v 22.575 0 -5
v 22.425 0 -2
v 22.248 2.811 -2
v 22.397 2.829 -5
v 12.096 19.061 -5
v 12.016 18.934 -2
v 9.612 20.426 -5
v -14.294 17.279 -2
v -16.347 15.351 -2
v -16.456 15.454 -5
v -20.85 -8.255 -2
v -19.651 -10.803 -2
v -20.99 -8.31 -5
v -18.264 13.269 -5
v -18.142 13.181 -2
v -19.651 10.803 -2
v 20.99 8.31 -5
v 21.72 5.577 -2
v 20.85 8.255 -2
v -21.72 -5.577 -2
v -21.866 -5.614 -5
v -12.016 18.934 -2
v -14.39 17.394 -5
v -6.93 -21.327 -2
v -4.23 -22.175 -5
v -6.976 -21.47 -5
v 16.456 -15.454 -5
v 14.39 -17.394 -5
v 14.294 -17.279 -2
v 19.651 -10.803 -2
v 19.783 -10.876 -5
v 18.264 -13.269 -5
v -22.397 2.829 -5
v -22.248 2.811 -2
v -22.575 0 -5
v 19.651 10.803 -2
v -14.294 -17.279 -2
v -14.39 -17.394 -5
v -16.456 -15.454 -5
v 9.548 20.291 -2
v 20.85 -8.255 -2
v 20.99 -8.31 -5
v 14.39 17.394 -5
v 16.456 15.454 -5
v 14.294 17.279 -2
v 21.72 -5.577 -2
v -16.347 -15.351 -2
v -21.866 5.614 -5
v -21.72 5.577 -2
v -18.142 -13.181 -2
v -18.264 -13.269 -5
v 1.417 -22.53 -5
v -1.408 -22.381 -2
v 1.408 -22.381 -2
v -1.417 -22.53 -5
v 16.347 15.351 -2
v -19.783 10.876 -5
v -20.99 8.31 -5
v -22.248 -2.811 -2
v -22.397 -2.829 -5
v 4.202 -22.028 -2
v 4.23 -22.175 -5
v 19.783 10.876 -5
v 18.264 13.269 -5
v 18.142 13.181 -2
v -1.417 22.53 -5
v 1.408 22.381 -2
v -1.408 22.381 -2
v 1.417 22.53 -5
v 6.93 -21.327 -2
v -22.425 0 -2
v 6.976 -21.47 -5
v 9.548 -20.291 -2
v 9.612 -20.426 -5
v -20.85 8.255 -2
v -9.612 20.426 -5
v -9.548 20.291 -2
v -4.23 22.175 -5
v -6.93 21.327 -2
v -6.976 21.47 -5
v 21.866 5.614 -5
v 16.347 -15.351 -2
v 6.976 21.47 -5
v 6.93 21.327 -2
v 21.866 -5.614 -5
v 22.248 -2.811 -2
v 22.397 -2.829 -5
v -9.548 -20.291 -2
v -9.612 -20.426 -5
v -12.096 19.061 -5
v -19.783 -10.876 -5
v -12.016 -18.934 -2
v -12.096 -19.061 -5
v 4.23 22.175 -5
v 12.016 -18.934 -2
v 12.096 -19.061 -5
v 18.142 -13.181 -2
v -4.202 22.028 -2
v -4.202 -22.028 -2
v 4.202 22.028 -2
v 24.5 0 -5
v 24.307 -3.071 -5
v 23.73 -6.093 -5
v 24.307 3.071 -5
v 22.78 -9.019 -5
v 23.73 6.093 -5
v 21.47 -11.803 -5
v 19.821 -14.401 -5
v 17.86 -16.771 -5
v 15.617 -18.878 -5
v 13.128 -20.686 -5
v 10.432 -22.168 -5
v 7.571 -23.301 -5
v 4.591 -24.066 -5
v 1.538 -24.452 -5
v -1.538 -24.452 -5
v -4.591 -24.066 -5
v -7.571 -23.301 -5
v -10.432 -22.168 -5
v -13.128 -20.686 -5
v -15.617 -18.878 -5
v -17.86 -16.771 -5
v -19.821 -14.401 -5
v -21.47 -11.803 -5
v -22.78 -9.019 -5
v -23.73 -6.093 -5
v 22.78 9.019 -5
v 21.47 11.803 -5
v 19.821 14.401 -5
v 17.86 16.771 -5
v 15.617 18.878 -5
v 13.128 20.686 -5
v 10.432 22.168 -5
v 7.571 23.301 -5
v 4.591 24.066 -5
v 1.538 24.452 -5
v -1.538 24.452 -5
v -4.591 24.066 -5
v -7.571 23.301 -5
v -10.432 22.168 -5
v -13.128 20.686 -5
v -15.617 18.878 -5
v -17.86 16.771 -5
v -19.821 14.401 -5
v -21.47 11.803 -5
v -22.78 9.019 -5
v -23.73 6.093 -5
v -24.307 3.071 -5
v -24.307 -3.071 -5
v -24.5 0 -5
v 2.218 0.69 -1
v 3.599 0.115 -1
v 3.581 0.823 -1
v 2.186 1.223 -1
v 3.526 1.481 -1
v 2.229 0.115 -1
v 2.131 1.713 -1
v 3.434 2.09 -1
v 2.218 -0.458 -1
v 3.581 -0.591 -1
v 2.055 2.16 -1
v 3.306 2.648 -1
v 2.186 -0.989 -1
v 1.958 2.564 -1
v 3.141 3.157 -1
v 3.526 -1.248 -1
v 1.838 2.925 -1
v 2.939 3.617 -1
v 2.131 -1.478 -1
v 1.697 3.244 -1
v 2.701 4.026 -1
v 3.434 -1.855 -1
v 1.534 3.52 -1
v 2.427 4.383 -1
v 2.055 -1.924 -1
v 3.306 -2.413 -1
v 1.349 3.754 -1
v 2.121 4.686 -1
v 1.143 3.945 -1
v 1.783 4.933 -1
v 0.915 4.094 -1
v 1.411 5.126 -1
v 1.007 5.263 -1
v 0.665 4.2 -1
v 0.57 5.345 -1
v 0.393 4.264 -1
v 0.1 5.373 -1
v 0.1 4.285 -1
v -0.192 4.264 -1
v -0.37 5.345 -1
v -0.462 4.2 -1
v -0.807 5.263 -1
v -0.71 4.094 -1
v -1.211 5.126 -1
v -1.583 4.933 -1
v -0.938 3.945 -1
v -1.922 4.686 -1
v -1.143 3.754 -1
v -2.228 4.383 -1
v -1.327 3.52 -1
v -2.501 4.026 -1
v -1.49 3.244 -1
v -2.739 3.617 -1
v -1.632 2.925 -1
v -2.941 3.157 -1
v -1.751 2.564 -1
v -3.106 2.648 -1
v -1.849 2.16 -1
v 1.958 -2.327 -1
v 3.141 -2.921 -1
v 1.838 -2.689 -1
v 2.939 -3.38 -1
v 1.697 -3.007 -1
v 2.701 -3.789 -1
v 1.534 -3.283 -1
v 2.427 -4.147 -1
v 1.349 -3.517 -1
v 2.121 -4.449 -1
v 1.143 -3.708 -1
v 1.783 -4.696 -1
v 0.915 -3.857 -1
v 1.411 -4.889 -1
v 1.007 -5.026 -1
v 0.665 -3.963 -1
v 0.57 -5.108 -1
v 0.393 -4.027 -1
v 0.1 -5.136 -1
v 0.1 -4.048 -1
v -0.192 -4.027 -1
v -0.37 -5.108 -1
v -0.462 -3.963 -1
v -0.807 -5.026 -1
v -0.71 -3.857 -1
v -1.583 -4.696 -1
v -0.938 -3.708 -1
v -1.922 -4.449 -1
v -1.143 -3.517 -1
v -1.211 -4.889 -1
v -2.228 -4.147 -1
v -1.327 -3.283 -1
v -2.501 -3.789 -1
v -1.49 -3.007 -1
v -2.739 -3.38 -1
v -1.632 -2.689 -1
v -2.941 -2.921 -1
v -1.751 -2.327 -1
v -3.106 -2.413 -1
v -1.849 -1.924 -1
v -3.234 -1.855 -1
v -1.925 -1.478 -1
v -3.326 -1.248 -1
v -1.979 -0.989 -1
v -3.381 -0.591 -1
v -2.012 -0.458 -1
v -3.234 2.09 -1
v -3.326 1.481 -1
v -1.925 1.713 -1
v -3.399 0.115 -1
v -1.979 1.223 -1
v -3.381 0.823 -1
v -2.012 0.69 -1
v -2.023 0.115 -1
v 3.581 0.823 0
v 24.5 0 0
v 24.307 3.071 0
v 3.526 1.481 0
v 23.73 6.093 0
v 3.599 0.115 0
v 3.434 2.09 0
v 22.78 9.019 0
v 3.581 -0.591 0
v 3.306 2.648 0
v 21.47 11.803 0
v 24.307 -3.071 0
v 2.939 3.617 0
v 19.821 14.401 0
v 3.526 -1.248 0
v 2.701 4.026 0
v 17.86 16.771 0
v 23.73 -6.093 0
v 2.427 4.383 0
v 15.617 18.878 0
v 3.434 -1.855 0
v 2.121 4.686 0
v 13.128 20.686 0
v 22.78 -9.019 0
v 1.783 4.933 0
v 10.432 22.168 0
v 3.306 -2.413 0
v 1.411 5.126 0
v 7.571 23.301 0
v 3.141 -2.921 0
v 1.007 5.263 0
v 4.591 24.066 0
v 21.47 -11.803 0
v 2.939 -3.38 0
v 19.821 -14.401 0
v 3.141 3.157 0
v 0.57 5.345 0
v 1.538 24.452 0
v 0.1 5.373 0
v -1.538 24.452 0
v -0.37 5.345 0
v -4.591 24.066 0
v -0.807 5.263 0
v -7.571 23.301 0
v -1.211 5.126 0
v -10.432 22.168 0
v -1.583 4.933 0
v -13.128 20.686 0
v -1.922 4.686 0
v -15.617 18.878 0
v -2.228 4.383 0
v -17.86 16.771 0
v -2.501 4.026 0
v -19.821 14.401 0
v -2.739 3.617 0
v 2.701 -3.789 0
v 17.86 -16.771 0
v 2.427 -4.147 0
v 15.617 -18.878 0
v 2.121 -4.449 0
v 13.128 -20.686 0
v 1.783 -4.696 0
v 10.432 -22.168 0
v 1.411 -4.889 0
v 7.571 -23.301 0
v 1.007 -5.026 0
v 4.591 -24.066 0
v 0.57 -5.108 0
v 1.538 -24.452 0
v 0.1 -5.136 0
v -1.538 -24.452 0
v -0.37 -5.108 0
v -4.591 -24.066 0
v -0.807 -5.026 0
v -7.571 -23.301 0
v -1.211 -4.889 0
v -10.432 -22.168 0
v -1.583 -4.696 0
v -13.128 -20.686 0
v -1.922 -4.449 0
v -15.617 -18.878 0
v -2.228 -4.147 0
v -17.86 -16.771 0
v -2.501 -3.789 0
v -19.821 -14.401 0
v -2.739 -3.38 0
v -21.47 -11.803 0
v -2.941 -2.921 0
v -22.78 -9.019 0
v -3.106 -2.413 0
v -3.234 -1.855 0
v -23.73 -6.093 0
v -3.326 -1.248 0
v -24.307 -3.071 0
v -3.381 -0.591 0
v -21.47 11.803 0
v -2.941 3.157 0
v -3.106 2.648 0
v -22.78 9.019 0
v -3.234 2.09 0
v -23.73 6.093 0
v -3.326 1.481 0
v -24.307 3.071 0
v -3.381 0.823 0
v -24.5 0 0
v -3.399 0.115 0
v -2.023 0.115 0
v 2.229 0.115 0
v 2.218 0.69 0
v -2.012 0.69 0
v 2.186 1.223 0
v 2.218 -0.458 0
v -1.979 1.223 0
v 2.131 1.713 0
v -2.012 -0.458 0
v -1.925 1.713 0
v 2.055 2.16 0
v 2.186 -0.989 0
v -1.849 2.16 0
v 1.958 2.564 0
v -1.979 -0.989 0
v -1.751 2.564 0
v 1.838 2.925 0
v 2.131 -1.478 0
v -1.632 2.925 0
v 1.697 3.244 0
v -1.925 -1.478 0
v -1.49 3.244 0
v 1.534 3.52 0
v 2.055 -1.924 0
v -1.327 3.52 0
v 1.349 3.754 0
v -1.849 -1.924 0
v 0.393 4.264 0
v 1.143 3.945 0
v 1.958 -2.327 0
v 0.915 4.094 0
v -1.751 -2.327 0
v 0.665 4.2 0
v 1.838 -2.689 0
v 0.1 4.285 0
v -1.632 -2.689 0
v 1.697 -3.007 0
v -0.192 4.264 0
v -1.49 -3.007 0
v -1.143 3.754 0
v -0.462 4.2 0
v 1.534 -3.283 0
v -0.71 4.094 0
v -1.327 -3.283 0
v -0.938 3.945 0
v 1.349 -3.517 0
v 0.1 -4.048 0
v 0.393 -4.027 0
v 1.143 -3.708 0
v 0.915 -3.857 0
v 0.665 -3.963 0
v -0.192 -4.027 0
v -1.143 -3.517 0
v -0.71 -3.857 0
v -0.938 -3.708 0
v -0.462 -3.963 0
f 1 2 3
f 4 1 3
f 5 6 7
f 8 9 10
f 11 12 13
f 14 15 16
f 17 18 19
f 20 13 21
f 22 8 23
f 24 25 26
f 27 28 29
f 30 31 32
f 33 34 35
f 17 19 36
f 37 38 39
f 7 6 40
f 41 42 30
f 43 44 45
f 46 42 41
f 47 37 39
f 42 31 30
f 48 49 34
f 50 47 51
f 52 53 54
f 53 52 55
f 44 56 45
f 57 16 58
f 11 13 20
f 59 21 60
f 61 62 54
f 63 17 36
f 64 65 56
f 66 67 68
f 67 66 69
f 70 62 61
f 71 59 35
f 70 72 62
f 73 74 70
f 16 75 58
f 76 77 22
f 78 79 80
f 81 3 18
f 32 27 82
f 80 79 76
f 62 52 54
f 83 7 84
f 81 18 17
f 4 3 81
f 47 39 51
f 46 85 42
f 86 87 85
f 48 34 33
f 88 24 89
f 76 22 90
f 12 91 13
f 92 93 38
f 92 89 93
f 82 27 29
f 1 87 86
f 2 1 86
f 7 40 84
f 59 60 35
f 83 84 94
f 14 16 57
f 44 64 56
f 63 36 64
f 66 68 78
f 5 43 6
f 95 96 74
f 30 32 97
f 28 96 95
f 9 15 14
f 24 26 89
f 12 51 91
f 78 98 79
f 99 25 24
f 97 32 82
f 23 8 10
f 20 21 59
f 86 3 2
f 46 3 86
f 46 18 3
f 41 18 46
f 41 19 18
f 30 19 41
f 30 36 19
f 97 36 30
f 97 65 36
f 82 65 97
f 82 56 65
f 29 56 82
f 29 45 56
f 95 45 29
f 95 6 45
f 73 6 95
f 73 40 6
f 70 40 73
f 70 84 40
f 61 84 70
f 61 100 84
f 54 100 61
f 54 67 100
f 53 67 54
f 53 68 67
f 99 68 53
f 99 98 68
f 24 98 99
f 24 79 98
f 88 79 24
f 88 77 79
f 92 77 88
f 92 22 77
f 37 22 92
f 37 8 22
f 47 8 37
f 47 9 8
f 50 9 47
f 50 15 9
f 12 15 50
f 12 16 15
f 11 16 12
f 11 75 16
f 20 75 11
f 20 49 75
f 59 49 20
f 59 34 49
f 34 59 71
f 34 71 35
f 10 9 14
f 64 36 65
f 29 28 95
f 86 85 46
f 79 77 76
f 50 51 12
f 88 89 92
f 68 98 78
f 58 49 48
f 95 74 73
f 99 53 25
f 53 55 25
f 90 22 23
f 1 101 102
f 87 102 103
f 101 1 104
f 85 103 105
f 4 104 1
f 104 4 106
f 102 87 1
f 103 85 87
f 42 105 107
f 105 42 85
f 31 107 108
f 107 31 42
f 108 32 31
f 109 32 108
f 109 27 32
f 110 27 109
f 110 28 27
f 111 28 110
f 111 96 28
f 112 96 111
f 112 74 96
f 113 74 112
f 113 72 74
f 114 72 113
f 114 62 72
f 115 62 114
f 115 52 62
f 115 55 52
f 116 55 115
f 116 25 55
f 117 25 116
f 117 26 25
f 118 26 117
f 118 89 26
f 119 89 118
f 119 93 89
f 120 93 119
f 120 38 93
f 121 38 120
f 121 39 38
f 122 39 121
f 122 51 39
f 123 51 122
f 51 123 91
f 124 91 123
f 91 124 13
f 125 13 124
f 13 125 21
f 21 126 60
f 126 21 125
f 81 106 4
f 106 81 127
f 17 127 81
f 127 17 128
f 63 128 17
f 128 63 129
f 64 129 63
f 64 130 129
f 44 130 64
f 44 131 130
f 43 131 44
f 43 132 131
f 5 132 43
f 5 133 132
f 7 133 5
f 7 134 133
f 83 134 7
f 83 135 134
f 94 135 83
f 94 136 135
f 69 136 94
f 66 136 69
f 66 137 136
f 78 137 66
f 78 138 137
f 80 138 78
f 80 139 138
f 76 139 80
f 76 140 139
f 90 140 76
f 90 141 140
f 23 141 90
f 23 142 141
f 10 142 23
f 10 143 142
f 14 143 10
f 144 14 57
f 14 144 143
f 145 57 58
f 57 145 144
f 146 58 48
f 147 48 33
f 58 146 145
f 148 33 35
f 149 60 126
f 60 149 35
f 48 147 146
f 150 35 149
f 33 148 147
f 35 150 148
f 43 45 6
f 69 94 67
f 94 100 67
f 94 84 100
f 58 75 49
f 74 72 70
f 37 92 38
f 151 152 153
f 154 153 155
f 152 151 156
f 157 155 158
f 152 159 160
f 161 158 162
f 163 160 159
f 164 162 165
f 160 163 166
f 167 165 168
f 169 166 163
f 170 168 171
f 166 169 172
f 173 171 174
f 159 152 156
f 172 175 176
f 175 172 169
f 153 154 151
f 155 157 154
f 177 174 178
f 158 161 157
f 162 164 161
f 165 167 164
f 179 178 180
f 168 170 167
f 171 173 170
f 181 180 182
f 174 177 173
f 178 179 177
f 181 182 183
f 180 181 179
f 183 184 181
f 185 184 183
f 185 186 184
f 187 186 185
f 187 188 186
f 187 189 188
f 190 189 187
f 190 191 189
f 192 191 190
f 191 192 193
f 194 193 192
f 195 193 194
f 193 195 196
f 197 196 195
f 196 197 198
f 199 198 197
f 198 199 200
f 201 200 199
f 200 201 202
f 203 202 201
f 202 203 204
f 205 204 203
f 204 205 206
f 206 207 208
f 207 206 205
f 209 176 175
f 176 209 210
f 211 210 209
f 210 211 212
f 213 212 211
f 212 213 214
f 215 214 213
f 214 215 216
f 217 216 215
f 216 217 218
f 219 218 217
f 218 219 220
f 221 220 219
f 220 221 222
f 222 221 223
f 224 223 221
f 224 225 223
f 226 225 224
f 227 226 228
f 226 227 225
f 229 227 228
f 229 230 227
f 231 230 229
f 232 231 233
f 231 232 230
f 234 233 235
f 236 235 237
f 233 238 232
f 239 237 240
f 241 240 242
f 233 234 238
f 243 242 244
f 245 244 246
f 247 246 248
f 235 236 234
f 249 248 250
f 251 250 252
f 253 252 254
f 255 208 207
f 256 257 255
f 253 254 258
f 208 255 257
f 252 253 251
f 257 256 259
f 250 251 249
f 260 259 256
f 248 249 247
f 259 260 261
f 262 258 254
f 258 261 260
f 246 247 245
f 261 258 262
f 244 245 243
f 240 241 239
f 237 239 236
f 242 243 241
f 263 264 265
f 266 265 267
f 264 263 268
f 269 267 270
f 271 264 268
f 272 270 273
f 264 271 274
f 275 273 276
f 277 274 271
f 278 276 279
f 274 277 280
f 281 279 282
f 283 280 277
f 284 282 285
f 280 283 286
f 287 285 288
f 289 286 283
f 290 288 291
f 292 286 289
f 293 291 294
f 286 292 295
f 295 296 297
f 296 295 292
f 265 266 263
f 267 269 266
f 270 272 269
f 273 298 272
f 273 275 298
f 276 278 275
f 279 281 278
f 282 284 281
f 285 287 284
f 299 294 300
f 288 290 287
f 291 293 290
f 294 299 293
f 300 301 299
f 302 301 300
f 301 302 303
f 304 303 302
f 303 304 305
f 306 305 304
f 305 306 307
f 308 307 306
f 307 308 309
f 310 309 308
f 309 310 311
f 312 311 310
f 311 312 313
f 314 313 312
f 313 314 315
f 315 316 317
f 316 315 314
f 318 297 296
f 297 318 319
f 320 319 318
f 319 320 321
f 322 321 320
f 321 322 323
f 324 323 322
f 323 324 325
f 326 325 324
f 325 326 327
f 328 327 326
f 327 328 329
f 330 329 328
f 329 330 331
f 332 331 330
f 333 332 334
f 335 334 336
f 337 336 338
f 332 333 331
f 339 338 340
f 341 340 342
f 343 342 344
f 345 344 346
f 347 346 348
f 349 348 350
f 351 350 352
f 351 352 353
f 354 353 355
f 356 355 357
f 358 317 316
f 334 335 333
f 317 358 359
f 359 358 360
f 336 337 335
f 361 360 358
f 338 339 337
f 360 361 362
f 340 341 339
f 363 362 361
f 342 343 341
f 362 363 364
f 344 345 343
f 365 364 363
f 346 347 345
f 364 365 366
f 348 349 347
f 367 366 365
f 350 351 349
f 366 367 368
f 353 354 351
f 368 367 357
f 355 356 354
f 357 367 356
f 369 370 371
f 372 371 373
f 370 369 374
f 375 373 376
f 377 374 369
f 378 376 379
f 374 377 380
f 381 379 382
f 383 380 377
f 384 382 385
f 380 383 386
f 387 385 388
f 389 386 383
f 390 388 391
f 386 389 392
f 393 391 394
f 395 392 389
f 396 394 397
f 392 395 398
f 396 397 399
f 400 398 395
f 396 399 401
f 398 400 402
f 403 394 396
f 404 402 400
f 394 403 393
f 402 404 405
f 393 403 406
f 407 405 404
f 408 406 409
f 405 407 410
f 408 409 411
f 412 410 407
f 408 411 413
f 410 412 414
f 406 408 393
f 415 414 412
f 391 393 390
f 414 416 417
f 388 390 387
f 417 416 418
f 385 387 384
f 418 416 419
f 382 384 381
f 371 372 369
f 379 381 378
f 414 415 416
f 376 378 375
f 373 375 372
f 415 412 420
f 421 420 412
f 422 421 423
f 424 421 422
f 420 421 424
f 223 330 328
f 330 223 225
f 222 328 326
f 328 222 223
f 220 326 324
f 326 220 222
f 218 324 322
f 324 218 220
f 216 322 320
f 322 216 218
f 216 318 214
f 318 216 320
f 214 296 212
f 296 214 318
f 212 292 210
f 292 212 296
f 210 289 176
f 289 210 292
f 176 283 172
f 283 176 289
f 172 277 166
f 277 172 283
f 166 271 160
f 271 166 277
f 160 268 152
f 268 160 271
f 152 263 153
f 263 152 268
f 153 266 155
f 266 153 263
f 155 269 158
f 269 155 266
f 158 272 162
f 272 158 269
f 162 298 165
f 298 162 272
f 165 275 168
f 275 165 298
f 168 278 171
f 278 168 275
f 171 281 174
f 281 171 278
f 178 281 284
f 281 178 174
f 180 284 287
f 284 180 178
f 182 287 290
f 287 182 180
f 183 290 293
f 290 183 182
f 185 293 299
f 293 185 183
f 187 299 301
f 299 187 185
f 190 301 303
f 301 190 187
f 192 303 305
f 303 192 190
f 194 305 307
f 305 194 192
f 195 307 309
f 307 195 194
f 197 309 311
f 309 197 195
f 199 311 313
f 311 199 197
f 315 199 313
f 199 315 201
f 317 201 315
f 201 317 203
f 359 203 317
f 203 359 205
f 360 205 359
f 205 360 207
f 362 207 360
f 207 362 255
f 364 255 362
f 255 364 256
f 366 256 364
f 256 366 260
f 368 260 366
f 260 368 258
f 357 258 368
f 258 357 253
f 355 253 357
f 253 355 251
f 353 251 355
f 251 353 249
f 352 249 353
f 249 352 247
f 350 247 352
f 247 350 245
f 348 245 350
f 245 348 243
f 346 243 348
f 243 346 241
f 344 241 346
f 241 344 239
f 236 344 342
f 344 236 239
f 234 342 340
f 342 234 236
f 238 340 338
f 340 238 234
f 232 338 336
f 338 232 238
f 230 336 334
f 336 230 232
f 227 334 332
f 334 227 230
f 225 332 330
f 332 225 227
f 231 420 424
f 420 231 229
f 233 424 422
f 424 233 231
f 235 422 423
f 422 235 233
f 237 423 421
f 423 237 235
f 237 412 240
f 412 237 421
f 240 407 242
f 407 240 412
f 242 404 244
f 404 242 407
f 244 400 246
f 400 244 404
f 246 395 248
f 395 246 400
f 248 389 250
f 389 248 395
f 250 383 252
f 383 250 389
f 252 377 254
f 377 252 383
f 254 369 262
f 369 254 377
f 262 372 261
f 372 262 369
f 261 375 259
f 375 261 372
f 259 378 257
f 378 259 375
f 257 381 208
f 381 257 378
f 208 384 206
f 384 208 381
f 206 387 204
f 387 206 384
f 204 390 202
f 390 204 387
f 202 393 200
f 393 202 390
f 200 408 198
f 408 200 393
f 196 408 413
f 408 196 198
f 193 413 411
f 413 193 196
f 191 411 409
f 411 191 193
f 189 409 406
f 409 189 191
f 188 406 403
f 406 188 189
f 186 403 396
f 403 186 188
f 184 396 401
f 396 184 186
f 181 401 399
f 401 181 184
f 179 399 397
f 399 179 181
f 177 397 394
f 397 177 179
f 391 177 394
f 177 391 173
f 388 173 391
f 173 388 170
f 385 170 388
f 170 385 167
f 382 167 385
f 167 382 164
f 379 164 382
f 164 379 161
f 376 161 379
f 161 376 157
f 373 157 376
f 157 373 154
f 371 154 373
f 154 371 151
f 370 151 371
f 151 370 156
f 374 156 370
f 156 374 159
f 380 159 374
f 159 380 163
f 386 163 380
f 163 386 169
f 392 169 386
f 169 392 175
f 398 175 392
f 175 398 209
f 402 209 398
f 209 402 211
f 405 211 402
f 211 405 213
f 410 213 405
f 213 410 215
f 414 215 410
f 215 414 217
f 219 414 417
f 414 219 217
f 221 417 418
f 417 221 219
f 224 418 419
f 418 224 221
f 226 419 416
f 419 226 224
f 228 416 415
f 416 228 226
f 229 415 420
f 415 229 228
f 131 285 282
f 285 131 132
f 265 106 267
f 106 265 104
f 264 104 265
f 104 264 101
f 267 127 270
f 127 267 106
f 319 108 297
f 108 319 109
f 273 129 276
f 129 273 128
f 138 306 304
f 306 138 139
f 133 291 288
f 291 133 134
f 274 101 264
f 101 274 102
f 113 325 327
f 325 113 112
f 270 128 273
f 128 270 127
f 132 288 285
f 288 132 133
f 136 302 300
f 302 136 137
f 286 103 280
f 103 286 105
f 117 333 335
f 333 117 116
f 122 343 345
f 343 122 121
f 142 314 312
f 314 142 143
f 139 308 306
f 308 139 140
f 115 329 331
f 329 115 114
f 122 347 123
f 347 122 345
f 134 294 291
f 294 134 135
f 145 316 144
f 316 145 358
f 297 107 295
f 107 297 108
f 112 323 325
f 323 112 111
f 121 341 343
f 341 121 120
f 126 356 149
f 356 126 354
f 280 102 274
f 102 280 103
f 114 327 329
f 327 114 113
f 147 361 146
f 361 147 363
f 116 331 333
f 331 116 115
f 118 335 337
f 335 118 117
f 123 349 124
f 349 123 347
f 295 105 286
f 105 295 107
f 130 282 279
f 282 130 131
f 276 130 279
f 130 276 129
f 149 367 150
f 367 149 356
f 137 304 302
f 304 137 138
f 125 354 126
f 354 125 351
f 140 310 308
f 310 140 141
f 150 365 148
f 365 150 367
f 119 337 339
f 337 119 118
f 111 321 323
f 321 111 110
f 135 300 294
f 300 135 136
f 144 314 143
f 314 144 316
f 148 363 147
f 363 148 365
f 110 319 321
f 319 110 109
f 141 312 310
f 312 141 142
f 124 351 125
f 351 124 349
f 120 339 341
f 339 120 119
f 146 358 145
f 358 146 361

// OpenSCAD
$fn = 50;


difference() {
	union() {
		translate(v = [0, 0, -5.0000000000]) {
			cylinder(h = 5, r = 24.5000000000);
		}
	}
	union() {
		#translate(v = [0, 0, -5.0000000000]) {
			cylinder(h = 3, r1 = 22.5750000000, r2 = 22.4250000000);
		}
		translate(v = [0, 0, -1]) {
			linear_extrude(height = 1) {
				text(font = "Impact", halign = "center", size = 10, text = "0", valign = "center");
			}
		}
	}
}
